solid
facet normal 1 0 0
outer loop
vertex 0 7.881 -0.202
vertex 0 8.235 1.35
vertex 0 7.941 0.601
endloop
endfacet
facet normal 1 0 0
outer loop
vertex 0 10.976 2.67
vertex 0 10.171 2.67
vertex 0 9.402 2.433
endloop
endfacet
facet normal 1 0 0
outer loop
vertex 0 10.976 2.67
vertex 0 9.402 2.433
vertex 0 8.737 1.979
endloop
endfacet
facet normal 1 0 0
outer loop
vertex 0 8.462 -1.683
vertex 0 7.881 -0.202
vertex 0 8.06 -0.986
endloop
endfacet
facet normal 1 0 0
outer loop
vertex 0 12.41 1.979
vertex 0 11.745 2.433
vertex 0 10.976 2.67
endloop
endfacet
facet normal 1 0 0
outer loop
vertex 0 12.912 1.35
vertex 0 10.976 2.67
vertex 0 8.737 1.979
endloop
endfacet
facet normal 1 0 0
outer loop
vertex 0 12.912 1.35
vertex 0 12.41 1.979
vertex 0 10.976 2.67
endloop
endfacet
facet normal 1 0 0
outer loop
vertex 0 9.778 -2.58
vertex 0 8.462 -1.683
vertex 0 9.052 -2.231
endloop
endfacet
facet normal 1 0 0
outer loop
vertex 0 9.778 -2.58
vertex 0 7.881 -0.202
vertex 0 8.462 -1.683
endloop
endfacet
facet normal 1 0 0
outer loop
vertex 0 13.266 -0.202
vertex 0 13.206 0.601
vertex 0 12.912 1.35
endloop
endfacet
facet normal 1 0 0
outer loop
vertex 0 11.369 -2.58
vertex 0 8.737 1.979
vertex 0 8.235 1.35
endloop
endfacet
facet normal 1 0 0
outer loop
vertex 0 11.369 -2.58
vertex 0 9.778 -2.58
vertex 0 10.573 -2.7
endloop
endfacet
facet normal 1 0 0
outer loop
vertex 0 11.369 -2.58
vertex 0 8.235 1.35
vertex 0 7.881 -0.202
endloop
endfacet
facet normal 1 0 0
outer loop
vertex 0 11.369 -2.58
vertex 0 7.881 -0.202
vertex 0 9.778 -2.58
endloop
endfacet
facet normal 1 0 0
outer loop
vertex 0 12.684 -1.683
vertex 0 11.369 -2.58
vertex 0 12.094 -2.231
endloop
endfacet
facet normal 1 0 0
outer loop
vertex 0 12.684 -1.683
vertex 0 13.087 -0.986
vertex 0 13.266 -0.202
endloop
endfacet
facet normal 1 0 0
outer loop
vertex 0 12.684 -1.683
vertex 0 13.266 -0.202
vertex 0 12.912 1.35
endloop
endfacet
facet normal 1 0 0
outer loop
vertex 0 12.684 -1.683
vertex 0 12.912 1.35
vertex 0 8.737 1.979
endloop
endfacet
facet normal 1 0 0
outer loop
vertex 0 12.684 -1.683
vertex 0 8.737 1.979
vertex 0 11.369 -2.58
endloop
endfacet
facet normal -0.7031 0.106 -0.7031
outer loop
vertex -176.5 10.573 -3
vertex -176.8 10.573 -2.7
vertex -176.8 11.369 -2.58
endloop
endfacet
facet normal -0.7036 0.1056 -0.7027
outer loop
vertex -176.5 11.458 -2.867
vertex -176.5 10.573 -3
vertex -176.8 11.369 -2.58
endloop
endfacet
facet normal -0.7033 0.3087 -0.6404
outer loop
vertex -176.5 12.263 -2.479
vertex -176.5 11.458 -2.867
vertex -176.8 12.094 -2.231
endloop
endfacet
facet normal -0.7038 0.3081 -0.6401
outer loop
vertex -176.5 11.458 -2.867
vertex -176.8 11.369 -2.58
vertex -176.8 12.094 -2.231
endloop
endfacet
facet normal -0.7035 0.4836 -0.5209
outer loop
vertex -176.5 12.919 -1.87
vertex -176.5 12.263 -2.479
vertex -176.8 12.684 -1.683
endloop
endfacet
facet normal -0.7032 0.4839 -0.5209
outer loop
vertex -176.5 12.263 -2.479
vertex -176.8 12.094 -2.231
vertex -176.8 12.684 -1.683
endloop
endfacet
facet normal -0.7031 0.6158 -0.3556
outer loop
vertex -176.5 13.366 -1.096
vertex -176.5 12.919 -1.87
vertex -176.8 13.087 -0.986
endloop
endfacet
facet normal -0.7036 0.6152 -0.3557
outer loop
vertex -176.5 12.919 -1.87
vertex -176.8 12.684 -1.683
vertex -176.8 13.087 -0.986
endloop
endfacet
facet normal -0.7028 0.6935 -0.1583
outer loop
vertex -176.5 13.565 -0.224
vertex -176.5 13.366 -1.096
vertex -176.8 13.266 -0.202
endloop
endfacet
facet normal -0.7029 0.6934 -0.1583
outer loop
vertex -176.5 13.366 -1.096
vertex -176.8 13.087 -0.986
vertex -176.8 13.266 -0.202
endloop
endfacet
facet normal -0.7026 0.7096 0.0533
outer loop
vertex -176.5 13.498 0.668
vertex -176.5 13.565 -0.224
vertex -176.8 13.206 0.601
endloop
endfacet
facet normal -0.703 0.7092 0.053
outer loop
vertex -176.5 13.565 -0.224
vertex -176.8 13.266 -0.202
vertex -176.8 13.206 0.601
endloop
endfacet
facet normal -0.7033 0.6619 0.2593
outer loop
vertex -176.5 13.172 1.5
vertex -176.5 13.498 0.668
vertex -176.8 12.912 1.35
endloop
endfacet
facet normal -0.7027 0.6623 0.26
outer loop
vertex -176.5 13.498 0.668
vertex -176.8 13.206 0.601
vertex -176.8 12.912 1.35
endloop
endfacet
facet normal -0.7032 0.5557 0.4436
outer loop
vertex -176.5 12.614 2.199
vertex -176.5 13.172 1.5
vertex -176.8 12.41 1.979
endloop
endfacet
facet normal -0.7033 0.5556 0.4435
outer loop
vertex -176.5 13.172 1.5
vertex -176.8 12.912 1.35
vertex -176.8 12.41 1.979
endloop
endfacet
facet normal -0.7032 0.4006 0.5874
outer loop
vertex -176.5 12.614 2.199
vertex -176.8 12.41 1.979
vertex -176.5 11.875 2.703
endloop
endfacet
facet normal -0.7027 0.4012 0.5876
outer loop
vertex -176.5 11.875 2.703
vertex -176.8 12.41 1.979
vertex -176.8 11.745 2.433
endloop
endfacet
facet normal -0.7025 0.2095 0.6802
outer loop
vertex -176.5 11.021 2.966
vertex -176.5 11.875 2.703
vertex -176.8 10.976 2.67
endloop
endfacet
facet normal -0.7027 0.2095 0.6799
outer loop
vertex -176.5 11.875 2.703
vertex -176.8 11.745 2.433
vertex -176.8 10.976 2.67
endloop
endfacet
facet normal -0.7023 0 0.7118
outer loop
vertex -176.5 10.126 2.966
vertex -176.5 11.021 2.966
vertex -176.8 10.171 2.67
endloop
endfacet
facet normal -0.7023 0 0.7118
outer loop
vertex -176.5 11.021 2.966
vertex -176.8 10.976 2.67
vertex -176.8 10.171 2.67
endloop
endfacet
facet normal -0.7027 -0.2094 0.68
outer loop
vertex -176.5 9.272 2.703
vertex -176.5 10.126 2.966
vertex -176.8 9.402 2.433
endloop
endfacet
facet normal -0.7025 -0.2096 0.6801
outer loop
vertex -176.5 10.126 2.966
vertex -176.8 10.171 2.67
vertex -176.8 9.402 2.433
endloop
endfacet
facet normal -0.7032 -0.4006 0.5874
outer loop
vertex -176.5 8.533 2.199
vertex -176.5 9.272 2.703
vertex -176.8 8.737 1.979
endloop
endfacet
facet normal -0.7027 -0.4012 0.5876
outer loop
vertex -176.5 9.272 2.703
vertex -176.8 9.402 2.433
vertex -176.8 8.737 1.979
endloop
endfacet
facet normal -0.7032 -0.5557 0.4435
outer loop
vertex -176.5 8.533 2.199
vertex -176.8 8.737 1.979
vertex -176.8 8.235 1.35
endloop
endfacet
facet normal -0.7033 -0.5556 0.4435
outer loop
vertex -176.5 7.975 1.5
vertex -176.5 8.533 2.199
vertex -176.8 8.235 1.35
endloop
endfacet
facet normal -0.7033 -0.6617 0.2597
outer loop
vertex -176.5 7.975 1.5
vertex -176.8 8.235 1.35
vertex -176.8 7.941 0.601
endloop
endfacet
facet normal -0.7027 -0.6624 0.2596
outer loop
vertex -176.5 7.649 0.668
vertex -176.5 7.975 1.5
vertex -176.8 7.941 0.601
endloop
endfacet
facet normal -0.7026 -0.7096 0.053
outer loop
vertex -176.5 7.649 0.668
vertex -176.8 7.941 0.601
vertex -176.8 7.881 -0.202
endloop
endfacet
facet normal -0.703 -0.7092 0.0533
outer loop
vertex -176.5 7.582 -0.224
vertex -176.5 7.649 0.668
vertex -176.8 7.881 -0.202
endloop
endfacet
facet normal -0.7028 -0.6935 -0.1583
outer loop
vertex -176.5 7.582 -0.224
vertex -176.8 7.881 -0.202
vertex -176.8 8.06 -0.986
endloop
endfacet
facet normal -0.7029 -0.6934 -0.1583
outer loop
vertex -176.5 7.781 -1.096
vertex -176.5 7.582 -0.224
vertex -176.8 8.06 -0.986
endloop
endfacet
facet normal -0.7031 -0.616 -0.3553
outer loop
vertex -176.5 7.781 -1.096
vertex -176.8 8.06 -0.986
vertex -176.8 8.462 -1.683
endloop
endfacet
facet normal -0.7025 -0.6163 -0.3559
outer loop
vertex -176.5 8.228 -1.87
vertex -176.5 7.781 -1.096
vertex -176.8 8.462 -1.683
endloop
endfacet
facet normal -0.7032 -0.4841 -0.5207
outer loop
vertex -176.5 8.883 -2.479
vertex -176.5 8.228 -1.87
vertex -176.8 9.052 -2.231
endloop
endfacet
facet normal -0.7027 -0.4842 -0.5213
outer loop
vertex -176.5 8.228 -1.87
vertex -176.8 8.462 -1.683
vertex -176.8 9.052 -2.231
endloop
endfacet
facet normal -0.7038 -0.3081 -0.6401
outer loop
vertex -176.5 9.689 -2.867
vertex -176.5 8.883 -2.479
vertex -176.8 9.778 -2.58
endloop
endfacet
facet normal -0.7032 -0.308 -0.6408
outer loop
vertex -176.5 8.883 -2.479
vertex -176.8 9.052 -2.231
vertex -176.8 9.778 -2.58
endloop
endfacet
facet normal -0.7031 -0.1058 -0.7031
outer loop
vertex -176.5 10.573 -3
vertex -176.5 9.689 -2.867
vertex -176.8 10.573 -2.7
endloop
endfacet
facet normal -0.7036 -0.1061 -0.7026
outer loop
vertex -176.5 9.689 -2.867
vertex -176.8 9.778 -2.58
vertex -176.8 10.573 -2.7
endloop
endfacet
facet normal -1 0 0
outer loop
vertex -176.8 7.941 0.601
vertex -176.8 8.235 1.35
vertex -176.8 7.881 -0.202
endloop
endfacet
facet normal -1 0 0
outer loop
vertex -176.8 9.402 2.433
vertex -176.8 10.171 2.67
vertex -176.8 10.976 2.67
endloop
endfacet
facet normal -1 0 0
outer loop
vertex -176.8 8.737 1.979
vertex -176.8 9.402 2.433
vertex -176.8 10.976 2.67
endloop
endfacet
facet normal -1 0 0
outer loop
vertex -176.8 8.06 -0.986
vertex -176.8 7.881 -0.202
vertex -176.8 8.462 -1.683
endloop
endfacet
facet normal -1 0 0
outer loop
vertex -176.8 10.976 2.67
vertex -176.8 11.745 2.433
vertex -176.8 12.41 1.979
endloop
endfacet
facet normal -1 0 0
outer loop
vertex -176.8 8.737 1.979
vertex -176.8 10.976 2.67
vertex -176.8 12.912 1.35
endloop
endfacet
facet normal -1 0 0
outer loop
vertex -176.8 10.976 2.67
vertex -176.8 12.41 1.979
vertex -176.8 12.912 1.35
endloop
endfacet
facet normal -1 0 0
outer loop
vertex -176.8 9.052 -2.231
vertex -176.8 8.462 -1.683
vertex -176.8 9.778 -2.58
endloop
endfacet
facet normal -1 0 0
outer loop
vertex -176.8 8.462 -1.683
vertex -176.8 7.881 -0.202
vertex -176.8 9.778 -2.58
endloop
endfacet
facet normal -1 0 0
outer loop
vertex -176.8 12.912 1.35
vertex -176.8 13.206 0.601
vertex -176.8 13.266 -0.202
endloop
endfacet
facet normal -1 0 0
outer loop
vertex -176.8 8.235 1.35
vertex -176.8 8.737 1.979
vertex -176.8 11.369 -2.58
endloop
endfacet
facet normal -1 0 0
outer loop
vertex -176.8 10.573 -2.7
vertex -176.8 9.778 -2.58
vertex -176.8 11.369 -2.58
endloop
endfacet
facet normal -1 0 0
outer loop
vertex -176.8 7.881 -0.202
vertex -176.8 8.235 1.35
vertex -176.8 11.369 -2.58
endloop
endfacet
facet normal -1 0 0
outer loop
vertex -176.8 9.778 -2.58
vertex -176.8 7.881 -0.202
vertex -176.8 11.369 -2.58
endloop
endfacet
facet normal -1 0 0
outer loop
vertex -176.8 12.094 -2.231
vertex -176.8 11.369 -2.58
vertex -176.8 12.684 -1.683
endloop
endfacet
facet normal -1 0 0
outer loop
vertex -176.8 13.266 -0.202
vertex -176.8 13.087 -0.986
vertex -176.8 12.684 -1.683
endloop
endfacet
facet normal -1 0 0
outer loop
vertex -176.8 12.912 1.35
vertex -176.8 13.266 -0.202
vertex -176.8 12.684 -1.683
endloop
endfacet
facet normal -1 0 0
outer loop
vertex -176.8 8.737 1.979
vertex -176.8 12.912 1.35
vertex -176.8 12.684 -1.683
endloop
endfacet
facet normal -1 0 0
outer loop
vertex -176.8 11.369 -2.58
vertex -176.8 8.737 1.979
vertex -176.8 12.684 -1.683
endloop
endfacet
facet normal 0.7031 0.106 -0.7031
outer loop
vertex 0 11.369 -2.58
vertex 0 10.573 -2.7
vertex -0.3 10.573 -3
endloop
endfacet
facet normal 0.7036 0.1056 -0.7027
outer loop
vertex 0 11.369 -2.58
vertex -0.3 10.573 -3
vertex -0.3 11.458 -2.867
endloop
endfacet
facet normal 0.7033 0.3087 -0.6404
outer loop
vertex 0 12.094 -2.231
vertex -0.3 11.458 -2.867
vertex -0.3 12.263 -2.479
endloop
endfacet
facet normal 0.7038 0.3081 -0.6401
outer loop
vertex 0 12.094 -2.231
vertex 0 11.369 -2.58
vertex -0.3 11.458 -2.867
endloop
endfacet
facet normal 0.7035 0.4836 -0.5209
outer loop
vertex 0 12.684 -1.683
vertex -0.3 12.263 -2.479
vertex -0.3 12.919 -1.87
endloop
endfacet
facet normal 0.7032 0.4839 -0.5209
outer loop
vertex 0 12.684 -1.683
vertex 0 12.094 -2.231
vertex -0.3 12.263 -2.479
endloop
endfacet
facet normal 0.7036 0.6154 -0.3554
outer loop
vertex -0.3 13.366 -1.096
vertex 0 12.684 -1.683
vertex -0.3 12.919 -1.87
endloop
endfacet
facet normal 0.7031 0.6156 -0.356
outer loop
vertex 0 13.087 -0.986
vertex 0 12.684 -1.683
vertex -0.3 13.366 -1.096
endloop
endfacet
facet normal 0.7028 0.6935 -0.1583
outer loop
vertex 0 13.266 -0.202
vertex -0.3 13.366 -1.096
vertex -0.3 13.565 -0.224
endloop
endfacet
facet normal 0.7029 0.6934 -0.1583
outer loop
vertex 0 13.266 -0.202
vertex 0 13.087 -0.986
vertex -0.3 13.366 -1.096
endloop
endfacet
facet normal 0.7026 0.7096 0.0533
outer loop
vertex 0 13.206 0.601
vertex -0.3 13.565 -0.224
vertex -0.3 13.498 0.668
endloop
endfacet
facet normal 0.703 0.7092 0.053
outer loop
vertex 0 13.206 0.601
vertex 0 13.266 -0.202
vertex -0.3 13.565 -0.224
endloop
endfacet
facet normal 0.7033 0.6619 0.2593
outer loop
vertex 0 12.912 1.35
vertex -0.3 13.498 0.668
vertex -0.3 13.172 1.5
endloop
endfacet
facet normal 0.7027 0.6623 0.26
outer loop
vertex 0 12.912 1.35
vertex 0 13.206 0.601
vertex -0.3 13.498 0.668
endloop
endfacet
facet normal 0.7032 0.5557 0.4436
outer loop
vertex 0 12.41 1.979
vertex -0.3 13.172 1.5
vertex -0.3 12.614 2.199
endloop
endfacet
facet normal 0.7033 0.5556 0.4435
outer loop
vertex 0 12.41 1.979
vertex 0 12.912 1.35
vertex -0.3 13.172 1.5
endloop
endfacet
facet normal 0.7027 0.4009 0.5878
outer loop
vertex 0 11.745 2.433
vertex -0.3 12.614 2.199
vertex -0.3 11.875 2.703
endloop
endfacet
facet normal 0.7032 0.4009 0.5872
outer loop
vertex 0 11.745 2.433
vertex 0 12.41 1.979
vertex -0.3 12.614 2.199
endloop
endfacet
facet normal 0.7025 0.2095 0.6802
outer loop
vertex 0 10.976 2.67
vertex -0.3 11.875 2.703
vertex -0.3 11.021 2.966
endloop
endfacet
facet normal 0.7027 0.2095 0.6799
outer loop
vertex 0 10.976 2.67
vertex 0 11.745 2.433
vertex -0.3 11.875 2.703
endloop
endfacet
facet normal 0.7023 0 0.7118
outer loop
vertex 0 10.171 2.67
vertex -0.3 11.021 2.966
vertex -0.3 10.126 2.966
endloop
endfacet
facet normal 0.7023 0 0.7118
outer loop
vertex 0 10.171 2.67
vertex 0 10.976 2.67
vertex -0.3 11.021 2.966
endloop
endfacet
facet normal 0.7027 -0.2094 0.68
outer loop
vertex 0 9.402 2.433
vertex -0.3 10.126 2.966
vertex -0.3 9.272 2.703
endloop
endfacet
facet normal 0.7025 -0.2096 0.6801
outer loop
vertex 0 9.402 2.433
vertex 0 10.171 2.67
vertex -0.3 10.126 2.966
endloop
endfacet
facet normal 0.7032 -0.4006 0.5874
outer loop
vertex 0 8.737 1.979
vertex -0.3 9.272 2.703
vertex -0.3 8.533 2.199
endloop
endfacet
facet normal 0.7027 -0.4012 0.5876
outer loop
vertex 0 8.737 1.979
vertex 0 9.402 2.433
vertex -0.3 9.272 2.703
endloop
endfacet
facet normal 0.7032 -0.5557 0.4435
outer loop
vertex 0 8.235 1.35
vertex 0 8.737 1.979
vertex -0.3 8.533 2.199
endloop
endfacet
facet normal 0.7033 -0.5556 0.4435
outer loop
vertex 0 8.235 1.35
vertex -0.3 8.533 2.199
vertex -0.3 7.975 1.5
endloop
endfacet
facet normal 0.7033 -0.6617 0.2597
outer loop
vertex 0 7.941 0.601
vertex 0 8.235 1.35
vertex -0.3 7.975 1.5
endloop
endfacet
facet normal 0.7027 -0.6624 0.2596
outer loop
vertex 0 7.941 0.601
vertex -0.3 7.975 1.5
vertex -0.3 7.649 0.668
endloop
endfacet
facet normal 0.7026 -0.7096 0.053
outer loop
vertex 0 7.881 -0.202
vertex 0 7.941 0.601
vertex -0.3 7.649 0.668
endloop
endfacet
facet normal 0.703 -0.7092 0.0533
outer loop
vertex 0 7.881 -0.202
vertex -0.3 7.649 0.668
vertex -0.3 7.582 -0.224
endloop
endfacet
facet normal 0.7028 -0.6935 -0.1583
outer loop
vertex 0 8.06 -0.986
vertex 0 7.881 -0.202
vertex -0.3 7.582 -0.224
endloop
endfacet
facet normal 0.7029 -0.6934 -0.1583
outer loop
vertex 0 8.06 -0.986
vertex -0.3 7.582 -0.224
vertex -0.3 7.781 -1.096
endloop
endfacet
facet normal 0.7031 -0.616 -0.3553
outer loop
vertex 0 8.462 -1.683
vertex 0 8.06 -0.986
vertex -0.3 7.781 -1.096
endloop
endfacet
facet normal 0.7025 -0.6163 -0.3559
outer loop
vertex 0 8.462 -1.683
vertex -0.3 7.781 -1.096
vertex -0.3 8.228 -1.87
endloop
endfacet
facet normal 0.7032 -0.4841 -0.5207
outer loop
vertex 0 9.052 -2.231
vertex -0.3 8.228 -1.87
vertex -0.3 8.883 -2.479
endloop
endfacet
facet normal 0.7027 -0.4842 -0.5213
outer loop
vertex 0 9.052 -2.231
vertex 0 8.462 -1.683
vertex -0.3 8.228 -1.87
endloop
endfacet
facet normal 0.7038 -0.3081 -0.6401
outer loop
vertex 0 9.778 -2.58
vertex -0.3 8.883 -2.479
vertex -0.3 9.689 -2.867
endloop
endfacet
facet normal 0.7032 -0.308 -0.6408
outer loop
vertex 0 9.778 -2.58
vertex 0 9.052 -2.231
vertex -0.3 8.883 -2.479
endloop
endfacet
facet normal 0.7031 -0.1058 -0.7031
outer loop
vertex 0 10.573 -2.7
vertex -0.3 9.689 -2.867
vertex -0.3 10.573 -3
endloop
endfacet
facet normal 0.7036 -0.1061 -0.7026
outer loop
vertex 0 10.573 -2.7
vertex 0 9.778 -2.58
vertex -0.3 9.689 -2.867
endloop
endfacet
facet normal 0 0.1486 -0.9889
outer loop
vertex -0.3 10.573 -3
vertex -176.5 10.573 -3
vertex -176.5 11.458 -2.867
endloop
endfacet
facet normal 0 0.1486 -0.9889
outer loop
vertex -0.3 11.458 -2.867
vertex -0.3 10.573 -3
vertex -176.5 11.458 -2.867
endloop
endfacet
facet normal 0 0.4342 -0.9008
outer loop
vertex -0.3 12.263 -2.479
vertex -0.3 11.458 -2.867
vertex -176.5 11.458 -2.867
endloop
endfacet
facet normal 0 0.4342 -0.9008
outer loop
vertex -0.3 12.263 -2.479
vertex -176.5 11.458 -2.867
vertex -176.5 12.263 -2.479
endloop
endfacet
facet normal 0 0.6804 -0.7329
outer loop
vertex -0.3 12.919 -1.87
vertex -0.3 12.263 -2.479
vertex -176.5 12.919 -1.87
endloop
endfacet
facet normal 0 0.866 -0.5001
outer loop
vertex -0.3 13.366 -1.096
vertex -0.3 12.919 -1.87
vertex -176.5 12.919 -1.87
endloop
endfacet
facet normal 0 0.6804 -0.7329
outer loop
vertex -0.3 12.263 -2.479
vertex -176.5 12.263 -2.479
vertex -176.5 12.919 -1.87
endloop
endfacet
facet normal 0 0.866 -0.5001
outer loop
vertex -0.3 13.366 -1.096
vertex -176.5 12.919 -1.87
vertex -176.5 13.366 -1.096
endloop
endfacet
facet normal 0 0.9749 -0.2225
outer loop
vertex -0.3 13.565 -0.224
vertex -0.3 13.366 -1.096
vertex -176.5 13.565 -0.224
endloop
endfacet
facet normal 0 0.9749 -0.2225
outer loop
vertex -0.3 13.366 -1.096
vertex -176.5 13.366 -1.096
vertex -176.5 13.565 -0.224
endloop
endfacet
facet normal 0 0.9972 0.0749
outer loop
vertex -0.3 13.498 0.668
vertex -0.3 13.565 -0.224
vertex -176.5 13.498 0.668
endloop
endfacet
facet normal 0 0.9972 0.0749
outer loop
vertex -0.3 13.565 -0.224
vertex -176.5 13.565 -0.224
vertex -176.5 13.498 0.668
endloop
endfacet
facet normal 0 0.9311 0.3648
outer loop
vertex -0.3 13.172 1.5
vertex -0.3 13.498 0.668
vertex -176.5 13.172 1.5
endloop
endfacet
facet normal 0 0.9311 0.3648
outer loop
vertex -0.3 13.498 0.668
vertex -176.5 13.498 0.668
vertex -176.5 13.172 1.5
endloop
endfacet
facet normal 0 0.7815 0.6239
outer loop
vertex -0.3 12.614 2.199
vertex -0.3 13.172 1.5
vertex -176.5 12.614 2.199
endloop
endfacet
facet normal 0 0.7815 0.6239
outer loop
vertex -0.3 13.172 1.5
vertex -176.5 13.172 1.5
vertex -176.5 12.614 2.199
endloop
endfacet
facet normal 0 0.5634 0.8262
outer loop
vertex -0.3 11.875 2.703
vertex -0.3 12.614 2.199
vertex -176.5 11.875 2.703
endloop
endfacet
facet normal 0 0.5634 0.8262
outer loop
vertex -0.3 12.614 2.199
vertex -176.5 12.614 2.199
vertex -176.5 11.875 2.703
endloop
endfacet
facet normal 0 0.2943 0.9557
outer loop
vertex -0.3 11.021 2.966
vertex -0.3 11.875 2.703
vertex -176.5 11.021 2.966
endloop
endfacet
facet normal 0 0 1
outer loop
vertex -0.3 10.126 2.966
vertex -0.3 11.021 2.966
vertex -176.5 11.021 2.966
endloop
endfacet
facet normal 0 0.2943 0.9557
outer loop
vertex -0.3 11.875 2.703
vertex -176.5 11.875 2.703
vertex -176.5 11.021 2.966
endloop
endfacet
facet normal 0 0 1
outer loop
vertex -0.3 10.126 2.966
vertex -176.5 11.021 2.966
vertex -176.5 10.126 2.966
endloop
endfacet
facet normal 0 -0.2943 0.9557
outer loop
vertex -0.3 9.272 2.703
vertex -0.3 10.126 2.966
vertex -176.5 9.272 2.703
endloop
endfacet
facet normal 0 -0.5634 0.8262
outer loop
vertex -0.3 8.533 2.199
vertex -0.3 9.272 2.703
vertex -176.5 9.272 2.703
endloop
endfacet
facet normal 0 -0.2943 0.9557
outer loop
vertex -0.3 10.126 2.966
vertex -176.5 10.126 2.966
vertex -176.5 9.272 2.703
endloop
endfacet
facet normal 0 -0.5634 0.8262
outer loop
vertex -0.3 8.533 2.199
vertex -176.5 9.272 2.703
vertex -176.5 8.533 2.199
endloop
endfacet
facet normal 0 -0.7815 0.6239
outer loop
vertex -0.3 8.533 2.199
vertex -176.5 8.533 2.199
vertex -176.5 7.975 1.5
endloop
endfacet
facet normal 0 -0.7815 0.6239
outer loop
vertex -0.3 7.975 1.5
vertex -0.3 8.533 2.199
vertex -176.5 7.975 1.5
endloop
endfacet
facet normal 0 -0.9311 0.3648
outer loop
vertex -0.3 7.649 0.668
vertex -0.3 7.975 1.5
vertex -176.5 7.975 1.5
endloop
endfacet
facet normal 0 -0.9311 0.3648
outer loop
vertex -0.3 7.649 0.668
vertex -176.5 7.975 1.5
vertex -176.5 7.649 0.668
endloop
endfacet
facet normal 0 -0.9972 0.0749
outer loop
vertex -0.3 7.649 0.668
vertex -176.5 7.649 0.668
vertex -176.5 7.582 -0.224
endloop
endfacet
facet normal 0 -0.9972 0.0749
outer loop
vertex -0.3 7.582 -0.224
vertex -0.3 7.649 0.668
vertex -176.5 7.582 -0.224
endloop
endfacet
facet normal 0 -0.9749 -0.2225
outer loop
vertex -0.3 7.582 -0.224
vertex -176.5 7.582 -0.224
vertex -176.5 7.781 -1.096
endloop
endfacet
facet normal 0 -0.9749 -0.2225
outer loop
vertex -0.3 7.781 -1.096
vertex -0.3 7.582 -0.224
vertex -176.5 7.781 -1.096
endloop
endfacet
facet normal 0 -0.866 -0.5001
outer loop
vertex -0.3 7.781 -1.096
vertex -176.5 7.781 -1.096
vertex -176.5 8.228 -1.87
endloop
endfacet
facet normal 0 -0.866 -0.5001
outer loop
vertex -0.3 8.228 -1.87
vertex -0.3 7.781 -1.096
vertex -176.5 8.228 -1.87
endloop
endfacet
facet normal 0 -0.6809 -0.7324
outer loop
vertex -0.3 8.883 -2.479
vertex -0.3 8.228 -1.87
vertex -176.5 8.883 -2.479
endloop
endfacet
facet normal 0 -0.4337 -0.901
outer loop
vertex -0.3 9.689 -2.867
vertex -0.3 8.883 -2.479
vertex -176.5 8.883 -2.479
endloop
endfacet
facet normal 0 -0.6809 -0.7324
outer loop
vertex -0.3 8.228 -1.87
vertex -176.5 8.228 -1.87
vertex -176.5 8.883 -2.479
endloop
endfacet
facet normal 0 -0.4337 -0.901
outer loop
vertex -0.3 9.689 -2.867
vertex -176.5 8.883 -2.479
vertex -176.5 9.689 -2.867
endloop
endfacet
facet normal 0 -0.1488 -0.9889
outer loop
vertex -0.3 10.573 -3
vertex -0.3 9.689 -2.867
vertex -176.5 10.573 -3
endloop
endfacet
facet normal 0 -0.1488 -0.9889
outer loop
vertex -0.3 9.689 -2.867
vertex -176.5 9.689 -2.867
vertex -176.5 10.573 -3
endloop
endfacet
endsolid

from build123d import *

# Parameters (mm, degrees)
SKETCH2_R                = 3
BOSS_EXTRUDE1_DEPTH      = 88.4
CHAMFER1_SIZE            = 0.3
CHAMFER1_OF_MIRROR1_SIZE = 0.3


with BuildPart() as part:
    # Sketch2 → Boss-Extrude1 (new body)
    with BuildSketch(Plane(origin=(0, 0, 0), x_dir=(0, 0, -1), z_dir=(1, 0, 0))):
        with Locations((0, 10.573433301)):
            Circle(SKETCH2_R)
    boss_extrude1 = extrude(amount=-BOSS_EXTRUDE1_DEPTH)

    # Chamfer1
    chamfer1_edges = [part.edges().sort_by_distance(p)[0] for p in [
        (0, 10.573433301, 3),
    ]]
    chamfer(chamfer1_edges, length=CHAMFER1_SIZE)

    # Mirror1: Boss-Extrude1 across plane
    add(boss_extrude1.mirror(Plane(origin=(-88.4, 10.573433301, 0), x_dir=(0, 0, 1), z_dir=(1, 0, 0))))

    # Chamfer1 of Mirror1
    chamfer1_of_mirror1_edges = [part.edges().sort_by_distance(p)[0] for p in [
        (-176.8, 10.573433301, 3),
    ]]
    chamfer(chamfer1_of_mirror1_edges, length=CHAMFER1_OF_MIRROR1_SIZE)


solid = part.part
